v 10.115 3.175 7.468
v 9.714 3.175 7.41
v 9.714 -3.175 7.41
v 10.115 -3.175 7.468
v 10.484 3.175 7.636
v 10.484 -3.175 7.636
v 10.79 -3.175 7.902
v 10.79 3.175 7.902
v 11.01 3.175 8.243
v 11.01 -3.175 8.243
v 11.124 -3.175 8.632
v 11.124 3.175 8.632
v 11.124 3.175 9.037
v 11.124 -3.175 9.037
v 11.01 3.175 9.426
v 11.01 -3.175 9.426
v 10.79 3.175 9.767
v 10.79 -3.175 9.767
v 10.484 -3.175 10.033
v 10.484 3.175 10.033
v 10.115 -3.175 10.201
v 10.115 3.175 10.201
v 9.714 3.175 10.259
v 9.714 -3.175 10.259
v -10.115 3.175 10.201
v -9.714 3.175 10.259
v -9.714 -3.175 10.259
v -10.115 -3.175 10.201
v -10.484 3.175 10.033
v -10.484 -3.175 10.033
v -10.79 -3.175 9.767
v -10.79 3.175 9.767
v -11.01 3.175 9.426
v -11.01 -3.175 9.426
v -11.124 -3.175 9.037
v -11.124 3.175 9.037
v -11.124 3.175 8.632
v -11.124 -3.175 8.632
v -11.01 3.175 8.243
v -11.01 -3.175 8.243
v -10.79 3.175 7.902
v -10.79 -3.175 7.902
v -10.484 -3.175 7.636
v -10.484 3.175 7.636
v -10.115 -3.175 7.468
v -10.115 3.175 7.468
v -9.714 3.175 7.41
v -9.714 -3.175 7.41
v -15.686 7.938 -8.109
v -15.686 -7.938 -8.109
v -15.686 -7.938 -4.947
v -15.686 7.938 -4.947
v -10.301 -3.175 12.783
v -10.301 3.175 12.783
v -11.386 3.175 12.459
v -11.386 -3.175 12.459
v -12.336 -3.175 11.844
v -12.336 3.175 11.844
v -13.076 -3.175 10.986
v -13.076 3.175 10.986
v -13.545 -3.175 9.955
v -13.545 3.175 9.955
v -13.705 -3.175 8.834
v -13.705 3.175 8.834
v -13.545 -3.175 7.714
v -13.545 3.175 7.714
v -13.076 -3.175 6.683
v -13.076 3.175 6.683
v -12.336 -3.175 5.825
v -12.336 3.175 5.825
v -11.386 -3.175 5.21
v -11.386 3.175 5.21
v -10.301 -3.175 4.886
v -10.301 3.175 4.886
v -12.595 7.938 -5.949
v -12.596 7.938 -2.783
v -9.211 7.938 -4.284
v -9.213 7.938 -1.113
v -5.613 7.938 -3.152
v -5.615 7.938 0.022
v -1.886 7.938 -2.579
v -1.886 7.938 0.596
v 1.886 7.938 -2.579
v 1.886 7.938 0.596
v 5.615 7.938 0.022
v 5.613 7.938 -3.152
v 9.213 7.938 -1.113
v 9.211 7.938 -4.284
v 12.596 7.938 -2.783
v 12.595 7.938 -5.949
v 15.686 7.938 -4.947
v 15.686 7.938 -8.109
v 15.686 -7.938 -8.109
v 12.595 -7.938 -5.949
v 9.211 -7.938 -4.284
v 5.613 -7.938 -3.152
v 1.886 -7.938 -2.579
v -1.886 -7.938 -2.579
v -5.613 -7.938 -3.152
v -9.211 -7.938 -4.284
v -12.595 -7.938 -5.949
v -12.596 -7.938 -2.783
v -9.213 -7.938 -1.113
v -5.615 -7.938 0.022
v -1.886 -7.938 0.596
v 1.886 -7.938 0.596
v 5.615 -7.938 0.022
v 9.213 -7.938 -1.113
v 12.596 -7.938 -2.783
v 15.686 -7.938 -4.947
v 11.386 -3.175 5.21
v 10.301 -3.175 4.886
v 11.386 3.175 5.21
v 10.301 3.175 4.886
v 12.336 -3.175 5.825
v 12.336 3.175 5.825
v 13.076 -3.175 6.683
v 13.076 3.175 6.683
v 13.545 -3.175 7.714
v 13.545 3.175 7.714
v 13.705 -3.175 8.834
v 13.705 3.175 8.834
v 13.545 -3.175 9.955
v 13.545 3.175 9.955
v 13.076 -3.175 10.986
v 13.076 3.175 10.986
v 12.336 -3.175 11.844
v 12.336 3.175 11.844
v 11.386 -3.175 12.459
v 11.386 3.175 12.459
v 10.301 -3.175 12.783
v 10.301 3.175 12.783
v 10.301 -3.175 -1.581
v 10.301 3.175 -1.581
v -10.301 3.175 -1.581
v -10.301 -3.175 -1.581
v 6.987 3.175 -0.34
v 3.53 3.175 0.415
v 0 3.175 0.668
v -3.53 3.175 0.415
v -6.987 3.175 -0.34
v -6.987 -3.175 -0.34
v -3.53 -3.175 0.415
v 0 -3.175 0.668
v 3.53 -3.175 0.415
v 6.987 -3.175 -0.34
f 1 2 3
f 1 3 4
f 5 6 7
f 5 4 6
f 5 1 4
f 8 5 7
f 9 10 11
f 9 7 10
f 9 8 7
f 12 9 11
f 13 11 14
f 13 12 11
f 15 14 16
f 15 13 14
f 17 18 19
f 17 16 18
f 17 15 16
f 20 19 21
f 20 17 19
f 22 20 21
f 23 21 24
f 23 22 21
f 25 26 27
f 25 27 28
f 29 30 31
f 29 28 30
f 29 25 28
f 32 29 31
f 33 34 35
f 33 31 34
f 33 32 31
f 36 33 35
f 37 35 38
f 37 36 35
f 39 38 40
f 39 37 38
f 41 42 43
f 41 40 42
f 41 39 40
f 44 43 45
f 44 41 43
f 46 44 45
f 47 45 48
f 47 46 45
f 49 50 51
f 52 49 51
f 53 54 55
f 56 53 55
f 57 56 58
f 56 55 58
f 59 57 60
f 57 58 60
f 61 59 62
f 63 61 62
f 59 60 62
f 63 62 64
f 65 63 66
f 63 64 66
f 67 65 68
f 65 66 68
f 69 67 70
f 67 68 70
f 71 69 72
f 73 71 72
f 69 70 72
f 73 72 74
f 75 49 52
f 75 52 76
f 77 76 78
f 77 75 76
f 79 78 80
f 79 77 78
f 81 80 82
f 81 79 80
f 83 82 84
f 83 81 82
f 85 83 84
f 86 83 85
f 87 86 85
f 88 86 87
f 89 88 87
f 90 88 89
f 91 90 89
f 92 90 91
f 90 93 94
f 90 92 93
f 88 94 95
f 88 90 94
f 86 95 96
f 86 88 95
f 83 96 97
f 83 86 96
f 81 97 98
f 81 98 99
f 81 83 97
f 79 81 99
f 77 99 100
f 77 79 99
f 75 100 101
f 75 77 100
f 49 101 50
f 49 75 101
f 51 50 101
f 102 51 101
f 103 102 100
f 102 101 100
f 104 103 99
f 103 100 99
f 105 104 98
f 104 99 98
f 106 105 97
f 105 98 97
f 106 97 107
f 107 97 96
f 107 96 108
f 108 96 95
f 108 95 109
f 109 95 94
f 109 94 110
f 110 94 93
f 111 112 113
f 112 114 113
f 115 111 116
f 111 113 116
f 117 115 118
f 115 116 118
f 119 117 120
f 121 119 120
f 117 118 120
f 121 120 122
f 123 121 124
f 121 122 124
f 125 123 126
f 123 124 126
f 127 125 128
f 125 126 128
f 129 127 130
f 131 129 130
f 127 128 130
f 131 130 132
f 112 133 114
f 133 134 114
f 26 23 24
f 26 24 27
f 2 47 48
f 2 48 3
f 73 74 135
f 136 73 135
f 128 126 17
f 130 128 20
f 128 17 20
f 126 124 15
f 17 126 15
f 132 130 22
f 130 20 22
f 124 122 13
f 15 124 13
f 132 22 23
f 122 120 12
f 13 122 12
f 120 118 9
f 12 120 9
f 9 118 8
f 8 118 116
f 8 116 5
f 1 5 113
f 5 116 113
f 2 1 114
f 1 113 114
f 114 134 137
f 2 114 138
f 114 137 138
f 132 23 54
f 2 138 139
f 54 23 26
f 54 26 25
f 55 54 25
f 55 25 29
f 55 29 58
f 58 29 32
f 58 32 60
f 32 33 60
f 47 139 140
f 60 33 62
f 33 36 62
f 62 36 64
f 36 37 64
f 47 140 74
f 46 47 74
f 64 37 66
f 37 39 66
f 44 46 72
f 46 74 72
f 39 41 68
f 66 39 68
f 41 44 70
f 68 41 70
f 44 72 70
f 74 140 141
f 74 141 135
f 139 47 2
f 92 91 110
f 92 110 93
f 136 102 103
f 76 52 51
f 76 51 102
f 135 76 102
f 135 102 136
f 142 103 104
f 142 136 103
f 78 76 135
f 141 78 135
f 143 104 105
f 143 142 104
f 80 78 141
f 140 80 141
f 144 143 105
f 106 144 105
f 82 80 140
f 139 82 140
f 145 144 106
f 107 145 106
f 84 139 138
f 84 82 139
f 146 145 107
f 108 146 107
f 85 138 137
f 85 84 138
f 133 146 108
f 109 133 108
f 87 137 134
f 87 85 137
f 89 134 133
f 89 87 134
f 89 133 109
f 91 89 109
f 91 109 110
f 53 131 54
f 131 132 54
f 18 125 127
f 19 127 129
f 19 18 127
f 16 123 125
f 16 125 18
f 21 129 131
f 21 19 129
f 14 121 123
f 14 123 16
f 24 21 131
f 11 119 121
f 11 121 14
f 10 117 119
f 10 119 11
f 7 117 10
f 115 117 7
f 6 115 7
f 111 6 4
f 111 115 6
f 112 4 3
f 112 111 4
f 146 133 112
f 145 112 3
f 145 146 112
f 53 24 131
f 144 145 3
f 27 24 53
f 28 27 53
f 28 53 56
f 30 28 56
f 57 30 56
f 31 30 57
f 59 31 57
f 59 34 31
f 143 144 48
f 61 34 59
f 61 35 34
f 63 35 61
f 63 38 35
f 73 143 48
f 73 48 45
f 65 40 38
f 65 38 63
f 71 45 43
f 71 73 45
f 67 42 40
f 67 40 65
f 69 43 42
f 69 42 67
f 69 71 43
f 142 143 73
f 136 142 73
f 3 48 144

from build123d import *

# Parameters (mm, degrees)
BOSS_EXTRUDE1_DEPTH = 3.175
BOSS_EXTRUDE2_DEPTH = 1.27
CUT_EXTRUDE1_DEPTH  = 10.82505851
SCALE1_SCALE        = 2.5


with BuildPart() as part:
    # Sketch2 → Boss-Extrude1 (new, symmetric)
    with BuildSketch(Plane(origin=(0, 0, 0), x_dir=(1, 0, 0), z_dir=(0, 1, 0))):
        with BuildLine():
            Line((-6.274527226, 2.24054867), (-6.274527226, 0.976118894))
            ThreePointArc((-6.274527226, 0.976118894), (0, -1.27), (6.274527226, 0.976118894))
            Line((6.274527226, 0.976118894), (6.274527226, 2.24054867))
            ThreePointArc((6.274527226, 2.24054867), (0, 0), (-6.274527226, 2.24054867))
        make_face()
    extrude(amount=BOSS_EXTRUDE1_DEPTH, both=True)

    # Sketch3 → Boss-Extrude2 (add, symmetric)
    with BuildSketch(Plane(origin=(0, 0, 0), x_dir=(1, 0, 0), z_dir=(0, 1, 0))):
        with BuildLine():
            Line((-4.120326649, -0.370528697), (4.120326649, -0.370528697))
            Line((4.120326649, -0.370528697), (4.120326649, -2.957433704))
            ThreePointArc((4.120326649, -2.957433704), (5.482164962, -4.536659699), (4.120326649, -6.115885694))
            Line((4.120326649, -6.115885694), (-4.120326649, -6.115885694))
            ThreePointArc((-4.120326649, -6.115885694), (-5.482164962, -4.536659699), (-4.120326649, -2.957433704))
            Line((-4.120326649, -2.957433704), (-4.120326649, -0.370528697))
        make_face()
    extrude(amount=BOSS_EXTRUDE2_DEPTH, both=True)

    # Sketch4 → Cut-Extrude1 (cut, through all)
    with BuildSketch(Plane(origin=(0, 1.27, 0), x_dir=(1, 0, 0), z_dir=(0, 1, 0))):
        with BuildLine():
            Line((-3.885588375, -3.966918266), (3.885588375, -3.966918266))
            ThreePointArc((3.885588375, -3.966918266), (4.455329808, -4.536659699), (3.885588375, -5.106401132))
            Line((3.885588375, -5.106401132), (-3.885588375, -5.106401132))
            ThreePointArc((-3.885588375, -5.106401132), (-4.455329808, -4.536659699), (-3.885588375, -3.966918266))
        make_face()
    extrude(amount=-CUT_EXTRUDE1_DEPTH, mode=Mode.SUBTRACT)


with BuildPart() as part_1:
    # Scale1: scaled about (0, 0, 1.671454739)
    add(part.part.scale(SCALE1_SCALE).moved(Location((0, 0, -2.507182109))))


solid = part_1.part
